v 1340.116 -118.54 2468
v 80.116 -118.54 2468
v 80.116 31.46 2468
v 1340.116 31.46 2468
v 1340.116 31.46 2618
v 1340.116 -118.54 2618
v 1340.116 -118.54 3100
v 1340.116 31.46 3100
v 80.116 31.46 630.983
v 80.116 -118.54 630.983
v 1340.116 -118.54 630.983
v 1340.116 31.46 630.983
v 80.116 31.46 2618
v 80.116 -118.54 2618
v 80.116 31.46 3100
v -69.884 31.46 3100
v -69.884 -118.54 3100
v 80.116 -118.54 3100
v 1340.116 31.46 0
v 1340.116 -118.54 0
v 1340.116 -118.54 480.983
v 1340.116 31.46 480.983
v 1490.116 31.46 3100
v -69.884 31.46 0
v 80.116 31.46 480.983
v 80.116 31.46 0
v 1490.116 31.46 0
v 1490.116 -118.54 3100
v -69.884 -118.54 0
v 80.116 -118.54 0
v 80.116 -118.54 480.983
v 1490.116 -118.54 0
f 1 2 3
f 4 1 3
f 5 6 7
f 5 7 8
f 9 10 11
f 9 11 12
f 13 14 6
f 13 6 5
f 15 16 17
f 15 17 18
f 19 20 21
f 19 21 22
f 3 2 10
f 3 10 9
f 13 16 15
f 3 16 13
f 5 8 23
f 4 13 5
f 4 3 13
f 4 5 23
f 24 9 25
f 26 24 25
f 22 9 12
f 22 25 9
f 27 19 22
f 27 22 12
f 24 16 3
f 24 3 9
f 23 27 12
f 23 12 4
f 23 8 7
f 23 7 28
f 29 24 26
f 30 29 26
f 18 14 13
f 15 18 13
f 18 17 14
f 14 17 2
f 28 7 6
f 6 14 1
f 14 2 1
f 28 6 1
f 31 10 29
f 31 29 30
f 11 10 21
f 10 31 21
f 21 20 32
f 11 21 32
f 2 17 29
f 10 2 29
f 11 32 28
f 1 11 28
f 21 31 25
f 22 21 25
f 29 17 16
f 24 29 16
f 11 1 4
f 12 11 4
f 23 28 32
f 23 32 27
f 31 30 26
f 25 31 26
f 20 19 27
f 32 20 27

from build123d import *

# Parameters (mm, degrees)
SKETCH1_W             = 150
SKETCH1_H             = 150
BOSS_EXTRUDE1_DEPTH   = 3100
BOSS_EXTRUDE1_2_DEPTH = 3100
BOSS_EXTRUDE2_REACH   = 3409.661
SKETCH2_W             = 150
SKETCH2_H             = 150


with BuildPart() as part:
    # Sketch1 → Boss-Extrude1 (new body)
    with BuildSketch(Plane.XY):
        with Locations((1415.115935895, -43.539736266)):
            Rectangle(SKETCH1_W, SKETCH1_H)
    extrude(amount=BOSS_EXTRUDE1_DEPTH)

    # Sketch2 → Boss-Extrude2 (add, up to next)
    with BuildSketch(Plane(origin=(80.115935895, 0, 0), x_dir=(0, 0, -1), z_dir=(1, 0, 0)), mode=Mode.PRIVATE) as boss_extrude2_sk1:
        with Locations((-2543, -43.539736266)):
            Rectangle(SKETCH2_W, SKETCH2_H)
    boss_extrude2_tool1 = extrude(boss_extrude2_sk1.sketch, amount=BOSS_EXTRUDE2_REACH, mode=Mode.PRIVATE) - part.part
    # Sketch2 → Boss-Extrude2 (add, up to next)
    with BuildSketch(Plane(origin=(80.115935895, 0, 0), x_dir=(0, 0, -1), z_dir=(1, 0, 0)), mode=Mode.PRIVATE) as boss_extrude2_sk2:
        with Locations((-555.982528713, -43.539736266)):
            Rectangle(SKETCH2_W, SKETCH2_H)
    boss_extrude2_tool2 = extrude(boss_extrude2_sk2.sketch, amount=BOSS_EXTRUDE2_REACH, mode=Mode.PRIVATE) - part.part


with BuildPart() as body_2:
    # Sketch1 → Boss-Extrude1 2 (new body)
    with BuildSketch(Plane.XY):
        with Locations((5.115935895, -43.539736266)):
            Rectangle(SKETCH1_W, SKETCH1_H)
    extrude(amount=BOSS_EXTRUDE1_2_DEPTH)


with BuildPart() as part_1:
    add(part.part)

    add(body_2.part)  # Boss-Extrude2 merges body 2
    add(boss_extrude2_tool1.solids().sort_by_distance((80.115936, -43.539736, 2543))[0])
    add(boss_extrude2_tool2.solids().sort_by_distance((80.115936, -43.539736, 555.982529))[0])


solid = part_1.part
